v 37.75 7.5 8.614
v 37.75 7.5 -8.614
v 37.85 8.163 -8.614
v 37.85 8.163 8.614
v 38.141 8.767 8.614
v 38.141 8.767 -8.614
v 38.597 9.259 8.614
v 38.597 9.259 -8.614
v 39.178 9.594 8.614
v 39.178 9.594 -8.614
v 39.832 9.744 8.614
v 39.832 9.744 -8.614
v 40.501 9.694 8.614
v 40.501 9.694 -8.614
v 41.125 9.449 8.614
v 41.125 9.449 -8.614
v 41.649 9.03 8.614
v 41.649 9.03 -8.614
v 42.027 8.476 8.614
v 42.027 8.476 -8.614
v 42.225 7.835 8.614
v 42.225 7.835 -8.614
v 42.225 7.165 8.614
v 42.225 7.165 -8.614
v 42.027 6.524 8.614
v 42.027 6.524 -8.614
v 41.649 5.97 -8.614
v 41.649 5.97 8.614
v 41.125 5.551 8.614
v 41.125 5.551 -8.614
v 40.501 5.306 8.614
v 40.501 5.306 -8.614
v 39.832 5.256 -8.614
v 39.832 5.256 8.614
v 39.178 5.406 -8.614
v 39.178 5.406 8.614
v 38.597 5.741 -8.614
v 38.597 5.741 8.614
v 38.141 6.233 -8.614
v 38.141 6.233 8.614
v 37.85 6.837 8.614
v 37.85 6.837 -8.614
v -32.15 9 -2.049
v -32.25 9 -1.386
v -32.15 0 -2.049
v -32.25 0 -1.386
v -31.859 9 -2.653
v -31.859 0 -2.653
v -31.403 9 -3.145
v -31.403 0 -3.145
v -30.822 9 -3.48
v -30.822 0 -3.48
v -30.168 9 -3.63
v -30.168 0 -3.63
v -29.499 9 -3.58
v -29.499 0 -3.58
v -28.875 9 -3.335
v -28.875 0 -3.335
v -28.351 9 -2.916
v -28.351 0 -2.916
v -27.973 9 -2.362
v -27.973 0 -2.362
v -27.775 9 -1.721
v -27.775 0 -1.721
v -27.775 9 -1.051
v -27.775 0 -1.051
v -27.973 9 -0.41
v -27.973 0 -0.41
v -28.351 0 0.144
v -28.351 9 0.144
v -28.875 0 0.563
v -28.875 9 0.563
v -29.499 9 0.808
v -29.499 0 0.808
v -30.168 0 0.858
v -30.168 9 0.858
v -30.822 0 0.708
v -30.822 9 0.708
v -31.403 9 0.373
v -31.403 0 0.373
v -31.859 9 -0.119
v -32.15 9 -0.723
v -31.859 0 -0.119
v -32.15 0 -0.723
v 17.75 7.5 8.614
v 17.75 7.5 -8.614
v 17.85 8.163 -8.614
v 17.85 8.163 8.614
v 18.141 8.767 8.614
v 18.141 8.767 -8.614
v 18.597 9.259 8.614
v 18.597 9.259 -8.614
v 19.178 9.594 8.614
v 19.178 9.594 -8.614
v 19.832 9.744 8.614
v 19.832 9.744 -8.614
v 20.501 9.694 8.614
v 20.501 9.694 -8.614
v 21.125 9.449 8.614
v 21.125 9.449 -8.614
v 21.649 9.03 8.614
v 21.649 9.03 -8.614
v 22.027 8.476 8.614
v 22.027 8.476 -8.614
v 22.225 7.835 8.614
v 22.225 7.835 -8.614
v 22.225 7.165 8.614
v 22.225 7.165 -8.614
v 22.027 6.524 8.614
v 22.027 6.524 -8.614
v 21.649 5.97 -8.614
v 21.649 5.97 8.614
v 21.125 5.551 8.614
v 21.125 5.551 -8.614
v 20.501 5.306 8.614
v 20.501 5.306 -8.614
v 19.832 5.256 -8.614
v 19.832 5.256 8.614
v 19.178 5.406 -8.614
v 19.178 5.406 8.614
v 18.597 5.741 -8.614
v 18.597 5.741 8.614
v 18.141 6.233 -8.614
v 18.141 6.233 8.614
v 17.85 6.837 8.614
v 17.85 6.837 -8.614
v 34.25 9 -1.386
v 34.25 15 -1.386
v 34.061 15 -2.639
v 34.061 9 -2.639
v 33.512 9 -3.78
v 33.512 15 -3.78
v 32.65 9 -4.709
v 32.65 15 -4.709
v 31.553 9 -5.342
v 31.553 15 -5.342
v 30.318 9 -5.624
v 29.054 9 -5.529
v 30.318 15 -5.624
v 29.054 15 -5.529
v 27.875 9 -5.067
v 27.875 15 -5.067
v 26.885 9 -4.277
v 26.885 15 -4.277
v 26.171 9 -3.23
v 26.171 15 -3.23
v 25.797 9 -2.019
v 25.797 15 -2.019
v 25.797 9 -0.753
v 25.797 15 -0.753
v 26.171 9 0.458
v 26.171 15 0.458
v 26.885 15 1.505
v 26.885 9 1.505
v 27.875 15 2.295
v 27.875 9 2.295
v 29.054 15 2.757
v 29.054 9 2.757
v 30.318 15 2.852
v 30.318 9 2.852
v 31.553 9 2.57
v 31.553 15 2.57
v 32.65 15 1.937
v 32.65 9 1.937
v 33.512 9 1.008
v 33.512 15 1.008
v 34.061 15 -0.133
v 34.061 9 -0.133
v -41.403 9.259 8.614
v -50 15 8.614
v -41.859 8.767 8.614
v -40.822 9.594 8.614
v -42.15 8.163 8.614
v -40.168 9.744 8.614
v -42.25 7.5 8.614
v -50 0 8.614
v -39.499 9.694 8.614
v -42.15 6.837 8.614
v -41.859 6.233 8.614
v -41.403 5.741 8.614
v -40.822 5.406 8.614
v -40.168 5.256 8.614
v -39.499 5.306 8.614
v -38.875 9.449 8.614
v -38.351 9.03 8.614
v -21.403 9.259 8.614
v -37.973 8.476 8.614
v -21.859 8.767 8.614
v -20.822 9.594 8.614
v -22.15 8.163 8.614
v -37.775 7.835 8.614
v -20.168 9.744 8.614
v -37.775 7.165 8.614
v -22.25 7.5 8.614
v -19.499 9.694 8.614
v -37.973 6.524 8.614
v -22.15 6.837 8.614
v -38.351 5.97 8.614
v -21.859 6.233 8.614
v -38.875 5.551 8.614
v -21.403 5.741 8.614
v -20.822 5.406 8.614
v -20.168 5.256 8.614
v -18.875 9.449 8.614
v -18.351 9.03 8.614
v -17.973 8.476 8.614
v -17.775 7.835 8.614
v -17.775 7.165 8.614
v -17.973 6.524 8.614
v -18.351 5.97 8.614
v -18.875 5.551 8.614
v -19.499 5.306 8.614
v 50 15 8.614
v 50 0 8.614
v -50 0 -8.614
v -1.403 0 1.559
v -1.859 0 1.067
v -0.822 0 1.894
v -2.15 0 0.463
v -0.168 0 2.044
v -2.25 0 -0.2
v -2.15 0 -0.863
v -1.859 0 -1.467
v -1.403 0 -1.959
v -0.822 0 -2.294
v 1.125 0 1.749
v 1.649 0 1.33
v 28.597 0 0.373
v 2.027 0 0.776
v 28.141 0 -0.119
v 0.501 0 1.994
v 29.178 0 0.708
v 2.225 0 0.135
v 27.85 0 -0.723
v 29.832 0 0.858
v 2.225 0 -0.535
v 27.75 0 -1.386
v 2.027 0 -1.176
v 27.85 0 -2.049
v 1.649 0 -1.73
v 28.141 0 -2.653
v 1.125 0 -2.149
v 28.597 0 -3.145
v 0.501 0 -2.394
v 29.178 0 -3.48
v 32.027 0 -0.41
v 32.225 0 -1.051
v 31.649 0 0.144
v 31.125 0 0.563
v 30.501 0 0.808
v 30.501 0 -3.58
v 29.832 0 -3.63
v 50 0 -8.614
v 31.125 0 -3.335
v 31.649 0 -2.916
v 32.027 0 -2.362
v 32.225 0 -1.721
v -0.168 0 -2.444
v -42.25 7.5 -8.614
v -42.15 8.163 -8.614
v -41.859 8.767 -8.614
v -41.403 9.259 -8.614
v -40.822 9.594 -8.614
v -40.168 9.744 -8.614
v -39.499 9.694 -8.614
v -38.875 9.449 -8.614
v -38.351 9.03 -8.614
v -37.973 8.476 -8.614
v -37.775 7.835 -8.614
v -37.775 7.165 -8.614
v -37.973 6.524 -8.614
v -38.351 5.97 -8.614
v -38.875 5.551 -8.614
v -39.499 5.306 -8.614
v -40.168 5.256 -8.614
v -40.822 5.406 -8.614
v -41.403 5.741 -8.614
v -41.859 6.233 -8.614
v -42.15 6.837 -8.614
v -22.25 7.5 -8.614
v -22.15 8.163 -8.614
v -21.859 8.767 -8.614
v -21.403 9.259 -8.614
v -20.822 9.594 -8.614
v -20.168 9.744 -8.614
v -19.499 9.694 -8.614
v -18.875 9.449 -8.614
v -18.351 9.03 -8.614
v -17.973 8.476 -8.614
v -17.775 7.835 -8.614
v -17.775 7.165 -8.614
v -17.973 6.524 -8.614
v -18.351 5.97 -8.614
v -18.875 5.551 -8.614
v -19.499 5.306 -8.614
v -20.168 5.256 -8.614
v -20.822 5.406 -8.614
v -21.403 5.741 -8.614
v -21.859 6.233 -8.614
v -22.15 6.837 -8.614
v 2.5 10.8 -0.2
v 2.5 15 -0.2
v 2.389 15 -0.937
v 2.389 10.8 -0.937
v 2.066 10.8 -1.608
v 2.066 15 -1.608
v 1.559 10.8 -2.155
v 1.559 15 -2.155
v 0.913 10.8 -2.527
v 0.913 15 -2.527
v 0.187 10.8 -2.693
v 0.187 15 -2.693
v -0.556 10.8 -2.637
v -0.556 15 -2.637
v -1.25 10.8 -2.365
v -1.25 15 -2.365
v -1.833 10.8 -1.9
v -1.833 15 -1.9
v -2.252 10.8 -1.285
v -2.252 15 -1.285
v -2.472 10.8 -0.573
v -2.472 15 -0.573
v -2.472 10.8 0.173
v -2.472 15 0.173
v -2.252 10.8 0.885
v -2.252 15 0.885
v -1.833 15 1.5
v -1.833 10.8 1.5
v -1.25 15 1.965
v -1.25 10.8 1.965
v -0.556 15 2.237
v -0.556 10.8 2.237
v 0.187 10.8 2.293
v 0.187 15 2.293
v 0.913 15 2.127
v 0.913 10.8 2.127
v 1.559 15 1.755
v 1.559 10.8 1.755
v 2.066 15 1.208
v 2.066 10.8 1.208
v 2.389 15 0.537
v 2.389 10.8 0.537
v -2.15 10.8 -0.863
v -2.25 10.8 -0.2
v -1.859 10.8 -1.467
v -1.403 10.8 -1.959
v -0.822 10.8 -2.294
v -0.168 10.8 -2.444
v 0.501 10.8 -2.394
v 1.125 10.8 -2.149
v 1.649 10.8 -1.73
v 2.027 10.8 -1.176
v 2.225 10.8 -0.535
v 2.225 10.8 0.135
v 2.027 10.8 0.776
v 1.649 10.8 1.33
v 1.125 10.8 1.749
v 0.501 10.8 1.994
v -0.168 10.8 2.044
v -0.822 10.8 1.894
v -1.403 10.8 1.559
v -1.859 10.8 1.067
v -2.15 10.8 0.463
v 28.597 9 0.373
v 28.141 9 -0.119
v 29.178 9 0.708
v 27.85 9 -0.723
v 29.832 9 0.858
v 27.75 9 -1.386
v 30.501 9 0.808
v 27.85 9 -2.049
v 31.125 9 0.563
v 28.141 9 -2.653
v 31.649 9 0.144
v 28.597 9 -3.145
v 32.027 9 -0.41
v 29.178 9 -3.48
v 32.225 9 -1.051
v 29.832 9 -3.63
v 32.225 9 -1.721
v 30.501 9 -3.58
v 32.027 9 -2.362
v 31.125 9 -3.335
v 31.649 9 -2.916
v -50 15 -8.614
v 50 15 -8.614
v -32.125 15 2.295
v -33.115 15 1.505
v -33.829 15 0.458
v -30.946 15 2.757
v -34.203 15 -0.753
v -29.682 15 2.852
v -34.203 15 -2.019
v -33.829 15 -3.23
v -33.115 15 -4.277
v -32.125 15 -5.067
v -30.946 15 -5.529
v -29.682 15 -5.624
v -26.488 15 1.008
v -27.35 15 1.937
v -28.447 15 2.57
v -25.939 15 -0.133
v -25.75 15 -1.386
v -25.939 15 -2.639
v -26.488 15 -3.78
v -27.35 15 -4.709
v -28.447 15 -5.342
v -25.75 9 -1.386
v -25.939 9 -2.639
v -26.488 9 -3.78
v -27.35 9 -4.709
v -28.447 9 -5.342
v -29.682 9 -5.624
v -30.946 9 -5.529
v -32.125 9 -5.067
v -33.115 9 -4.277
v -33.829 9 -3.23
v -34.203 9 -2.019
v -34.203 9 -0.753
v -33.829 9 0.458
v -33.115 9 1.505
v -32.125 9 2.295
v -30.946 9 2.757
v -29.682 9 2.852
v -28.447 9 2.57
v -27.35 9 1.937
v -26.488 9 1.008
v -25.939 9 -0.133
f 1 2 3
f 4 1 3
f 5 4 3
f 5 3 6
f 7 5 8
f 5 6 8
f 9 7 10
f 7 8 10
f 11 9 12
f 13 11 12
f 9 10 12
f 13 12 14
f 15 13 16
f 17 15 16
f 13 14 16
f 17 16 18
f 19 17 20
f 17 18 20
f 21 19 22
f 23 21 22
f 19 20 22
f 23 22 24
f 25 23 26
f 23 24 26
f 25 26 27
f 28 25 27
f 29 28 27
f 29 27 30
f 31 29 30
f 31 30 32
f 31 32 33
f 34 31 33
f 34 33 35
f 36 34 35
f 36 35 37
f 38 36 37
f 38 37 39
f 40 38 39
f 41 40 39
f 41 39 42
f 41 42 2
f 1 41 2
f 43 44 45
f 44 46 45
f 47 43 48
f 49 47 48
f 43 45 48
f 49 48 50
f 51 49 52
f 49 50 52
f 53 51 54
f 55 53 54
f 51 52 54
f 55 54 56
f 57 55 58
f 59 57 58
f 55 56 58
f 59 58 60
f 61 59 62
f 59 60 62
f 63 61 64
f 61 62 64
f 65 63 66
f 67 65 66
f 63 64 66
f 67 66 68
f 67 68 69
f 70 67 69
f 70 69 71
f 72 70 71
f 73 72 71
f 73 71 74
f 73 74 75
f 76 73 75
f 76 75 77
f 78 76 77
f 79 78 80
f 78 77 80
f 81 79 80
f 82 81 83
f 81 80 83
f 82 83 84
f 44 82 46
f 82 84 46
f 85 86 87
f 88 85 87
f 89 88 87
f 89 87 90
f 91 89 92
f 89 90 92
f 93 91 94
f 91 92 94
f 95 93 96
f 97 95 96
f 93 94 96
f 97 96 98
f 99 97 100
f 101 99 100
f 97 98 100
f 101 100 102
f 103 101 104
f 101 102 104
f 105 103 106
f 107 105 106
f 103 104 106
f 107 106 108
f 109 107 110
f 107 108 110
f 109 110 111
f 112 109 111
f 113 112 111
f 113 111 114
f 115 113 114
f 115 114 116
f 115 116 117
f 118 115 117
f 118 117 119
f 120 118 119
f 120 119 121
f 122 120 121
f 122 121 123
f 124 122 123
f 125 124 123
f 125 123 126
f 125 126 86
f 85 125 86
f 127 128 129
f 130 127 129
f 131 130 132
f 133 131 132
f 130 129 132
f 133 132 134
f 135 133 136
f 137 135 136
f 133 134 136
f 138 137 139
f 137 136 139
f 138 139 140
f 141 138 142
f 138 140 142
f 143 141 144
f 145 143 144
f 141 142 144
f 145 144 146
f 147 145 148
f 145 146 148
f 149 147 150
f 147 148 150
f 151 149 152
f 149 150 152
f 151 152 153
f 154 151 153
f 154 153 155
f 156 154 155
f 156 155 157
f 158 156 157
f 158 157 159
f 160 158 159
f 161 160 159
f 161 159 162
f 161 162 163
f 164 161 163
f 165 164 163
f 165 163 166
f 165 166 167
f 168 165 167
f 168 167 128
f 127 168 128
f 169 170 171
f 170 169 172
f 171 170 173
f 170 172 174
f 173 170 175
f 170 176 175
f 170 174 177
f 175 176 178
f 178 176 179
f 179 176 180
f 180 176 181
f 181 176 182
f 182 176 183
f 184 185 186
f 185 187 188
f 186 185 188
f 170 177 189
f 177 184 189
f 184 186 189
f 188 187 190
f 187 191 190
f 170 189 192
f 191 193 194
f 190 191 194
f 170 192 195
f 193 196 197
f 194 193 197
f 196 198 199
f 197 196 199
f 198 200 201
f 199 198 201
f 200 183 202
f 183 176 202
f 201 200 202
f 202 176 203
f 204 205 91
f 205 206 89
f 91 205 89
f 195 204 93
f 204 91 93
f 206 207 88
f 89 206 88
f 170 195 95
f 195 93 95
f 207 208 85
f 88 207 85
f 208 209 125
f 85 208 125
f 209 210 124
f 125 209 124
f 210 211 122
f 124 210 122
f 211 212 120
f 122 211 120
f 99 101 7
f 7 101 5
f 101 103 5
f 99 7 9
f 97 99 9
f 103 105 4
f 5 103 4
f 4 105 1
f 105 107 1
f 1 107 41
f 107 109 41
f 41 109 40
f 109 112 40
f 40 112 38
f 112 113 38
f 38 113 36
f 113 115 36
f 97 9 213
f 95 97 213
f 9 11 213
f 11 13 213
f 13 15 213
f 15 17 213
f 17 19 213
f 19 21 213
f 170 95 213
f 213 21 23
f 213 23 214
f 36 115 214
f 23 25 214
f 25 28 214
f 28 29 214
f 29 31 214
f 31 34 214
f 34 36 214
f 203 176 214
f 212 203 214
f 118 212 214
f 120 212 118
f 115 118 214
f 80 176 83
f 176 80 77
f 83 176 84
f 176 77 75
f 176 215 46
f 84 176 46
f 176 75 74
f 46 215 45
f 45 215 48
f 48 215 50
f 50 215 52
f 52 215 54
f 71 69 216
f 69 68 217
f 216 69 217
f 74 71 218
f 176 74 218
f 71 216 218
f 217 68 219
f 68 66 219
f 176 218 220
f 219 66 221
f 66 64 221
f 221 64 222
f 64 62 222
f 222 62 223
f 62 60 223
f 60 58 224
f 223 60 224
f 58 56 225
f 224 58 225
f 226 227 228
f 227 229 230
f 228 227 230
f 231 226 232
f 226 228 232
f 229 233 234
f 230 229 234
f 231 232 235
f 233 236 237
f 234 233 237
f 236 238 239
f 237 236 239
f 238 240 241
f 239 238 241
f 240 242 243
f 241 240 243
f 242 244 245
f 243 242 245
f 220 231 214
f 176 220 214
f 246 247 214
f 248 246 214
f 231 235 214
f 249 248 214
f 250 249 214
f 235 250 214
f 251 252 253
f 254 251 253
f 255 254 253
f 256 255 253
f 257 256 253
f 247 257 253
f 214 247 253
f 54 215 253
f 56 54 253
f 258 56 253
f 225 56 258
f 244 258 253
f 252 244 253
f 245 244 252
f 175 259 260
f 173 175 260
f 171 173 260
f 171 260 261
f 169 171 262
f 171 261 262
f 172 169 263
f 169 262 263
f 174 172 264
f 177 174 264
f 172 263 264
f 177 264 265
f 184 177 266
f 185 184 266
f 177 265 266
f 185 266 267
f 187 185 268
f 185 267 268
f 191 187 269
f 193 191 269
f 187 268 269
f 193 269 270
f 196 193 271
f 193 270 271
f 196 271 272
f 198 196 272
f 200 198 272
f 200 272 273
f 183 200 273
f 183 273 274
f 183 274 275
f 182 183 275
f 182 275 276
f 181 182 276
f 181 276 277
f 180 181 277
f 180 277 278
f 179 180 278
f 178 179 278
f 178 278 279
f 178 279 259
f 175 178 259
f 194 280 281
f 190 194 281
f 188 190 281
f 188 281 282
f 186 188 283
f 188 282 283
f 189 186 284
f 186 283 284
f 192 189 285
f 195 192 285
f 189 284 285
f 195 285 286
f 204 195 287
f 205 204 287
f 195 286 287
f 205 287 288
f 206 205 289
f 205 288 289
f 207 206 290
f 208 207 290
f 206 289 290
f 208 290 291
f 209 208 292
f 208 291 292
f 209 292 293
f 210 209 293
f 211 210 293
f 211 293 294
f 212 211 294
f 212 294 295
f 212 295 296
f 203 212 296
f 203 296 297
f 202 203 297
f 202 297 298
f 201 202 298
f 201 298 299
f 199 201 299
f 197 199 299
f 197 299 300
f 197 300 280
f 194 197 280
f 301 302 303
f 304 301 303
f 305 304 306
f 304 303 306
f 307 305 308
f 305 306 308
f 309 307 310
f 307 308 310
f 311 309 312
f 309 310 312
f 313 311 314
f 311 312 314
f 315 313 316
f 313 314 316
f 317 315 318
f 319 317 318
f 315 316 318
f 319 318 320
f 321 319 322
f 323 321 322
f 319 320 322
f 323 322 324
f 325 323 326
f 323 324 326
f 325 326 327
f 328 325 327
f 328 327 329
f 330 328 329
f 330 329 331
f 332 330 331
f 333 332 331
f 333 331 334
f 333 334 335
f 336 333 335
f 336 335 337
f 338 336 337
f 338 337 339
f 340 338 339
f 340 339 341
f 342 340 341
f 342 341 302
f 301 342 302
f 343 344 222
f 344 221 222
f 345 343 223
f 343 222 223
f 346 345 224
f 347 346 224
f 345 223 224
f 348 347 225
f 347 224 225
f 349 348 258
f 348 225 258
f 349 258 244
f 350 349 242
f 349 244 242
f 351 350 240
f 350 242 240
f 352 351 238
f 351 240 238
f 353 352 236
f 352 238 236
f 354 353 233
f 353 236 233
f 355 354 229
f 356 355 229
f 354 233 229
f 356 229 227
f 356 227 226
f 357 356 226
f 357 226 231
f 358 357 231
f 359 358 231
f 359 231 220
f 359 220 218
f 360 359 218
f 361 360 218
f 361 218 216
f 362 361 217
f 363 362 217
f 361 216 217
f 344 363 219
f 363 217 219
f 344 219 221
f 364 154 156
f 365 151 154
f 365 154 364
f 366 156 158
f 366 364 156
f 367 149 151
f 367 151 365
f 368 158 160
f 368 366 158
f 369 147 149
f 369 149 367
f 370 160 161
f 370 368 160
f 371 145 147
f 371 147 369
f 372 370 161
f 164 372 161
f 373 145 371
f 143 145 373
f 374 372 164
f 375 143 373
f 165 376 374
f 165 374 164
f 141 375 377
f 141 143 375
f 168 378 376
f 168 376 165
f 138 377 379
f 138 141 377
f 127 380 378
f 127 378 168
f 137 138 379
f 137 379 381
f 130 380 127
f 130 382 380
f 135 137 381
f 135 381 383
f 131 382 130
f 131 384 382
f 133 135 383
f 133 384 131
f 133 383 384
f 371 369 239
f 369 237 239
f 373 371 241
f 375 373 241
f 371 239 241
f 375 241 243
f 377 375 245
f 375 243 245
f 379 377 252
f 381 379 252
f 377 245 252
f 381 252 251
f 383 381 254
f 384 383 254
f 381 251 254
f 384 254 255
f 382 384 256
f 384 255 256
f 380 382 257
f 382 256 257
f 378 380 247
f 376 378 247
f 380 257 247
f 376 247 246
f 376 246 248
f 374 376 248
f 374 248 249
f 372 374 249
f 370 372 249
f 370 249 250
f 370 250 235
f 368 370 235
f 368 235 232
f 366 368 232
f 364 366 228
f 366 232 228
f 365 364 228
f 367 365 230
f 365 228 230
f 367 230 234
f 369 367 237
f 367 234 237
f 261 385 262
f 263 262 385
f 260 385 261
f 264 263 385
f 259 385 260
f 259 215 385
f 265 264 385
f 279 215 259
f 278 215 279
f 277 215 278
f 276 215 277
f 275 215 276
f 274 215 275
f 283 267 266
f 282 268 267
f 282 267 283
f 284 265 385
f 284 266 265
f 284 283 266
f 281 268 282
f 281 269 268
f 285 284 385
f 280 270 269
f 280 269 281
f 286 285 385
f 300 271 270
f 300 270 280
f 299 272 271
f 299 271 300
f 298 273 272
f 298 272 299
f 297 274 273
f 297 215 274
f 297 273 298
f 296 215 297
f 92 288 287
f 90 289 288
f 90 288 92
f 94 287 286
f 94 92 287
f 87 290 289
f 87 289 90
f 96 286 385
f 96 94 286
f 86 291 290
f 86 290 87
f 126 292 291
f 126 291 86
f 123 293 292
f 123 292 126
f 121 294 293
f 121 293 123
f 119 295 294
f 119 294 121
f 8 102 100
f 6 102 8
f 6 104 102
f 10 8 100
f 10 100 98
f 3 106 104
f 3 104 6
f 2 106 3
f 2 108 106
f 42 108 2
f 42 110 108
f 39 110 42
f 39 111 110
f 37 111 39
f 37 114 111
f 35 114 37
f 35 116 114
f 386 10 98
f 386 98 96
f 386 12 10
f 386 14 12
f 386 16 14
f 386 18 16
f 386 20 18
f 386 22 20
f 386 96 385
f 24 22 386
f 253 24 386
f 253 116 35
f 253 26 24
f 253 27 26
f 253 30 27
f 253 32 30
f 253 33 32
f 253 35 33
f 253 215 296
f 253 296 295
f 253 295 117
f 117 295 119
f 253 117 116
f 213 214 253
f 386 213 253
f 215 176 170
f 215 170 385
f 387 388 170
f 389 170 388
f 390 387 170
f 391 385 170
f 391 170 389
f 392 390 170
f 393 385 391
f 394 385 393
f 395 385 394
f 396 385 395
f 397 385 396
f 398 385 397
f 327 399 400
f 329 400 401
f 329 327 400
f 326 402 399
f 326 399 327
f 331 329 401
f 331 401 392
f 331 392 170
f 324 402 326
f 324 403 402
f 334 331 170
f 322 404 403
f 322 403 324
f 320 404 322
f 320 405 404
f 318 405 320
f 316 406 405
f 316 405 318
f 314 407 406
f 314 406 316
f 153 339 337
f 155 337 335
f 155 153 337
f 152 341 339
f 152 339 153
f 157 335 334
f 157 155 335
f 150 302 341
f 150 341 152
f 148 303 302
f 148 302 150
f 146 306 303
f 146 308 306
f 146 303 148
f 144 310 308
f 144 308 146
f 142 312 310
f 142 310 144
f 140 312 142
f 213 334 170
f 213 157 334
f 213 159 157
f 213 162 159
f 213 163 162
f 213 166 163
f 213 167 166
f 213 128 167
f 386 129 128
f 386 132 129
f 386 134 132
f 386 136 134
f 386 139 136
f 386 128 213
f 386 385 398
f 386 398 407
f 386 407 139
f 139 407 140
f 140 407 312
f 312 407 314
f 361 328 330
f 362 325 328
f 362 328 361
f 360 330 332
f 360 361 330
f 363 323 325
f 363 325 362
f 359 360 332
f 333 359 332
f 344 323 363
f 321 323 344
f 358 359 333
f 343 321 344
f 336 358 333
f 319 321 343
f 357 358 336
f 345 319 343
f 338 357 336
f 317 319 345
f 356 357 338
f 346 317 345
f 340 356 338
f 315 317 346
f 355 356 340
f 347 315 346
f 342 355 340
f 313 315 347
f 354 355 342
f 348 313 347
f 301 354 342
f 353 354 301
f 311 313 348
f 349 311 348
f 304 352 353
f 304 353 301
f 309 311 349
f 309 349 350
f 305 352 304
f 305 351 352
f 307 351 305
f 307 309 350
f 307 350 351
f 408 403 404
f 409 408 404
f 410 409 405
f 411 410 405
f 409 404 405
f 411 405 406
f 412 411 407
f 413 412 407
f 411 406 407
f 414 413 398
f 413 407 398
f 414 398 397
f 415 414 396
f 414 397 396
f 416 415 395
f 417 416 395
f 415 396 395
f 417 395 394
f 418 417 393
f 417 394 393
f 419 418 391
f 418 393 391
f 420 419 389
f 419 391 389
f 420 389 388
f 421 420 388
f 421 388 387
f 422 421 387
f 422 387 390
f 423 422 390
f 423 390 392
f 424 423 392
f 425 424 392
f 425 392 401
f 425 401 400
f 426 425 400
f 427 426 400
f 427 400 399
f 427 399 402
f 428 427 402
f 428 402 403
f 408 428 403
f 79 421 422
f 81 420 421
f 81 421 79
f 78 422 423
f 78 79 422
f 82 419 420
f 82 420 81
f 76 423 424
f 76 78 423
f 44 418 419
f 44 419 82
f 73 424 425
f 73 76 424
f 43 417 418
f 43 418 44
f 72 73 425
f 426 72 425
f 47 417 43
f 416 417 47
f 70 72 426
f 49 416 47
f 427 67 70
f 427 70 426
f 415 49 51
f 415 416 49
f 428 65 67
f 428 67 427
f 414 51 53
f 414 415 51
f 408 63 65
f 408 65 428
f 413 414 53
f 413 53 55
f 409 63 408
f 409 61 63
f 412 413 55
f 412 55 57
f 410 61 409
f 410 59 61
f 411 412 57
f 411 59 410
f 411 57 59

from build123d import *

# Parameters (mm, degrees)
SKETCH1_W                               = 100
SKETCH1_H                               = 17.228
BOSS_EXTRUDE1_DEPTH                     = 15
CBORE_FOR_M5_HEX_HEAD_BOLT1_D           = 4.5
CBORE_FOR_M5_HEX_HEAD_BOLT1_CBORE_D     = 8.5
CBORE_FOR_M5_HEX_HEAD_BOLT1_CBORE_DEPTH = 6
M4_CLEARANCE_HOLE1_D                    = 4.5
CBORE_FOR_M5_HEX_HEAD_BOLT2_D           = 4.5
CBORE_FOR_M5_HEX_HEAD_BOLT2_CBORE_D     = 5
CBORE_FOR_M5_HEX_HEAD_BOLT2_CBORE_DEPTH = 4.2


with BuildPart() as part:
    # Sketch1 → Boss-Extrude1 (new body)
    with BuildSketch(Plane(origin=(0, 0, 0), x_dir=(1, 0, 0), z_dir=(0, 1, 0))):
        Rectangle(SKETCH1_W, SKETCH1_H)
    extrude(amount=BOSS_EXTRUDE1_DEPTH)

    # CBORE for M5 Hex Head Bolt1 (through all)
    with Locations(Plane(origin=(0, 15, 0), x_dir=(1, 0, 0), z_dir=(0, 1, 0))):
        with Locations((-30, 1.386), (30, 1.386)):
            CounterBoreHole(CBORE_FOR_M5_HEX_HEAD_BOLT1_D / 2, CBORE_FOR_M5_HEX_HEAD_BOLT1_CBORE_D / 2, CBORE_FOR_M5_HEX_HEAD_BOLT1_CBORE_DEPTH)

    # M4 Clearance Hole1 (through all)
    with Locations(Plane.XY.offset(8.614)):
        with Locations((-20, 7.5), (20, 7.5), (-40, 7.5), (40, 7.5)):
            Hole(M4_CLEARANCE_HOLE1_D / 2)

    # CBORE for M5 Hex Head Bolt2 (through all)
    with Locations(Plane(origin=(0, 15, 0), x_dir=(1, 0, 0), z_dir=(0, 1, 0))):
        with Locations((0, 0.2)):
            CounterBoreHole(CBORE_FOR_M5_HEX_HEAD_BOLT2_D / 2, CBORE_FOR_M5_HEX_HEAD_BOLT2_CBORE_D / 2, CBORE_FOR_M5_HEX_HEAD_BOLT2_CBORE_DEPTH)


solid = part.part
